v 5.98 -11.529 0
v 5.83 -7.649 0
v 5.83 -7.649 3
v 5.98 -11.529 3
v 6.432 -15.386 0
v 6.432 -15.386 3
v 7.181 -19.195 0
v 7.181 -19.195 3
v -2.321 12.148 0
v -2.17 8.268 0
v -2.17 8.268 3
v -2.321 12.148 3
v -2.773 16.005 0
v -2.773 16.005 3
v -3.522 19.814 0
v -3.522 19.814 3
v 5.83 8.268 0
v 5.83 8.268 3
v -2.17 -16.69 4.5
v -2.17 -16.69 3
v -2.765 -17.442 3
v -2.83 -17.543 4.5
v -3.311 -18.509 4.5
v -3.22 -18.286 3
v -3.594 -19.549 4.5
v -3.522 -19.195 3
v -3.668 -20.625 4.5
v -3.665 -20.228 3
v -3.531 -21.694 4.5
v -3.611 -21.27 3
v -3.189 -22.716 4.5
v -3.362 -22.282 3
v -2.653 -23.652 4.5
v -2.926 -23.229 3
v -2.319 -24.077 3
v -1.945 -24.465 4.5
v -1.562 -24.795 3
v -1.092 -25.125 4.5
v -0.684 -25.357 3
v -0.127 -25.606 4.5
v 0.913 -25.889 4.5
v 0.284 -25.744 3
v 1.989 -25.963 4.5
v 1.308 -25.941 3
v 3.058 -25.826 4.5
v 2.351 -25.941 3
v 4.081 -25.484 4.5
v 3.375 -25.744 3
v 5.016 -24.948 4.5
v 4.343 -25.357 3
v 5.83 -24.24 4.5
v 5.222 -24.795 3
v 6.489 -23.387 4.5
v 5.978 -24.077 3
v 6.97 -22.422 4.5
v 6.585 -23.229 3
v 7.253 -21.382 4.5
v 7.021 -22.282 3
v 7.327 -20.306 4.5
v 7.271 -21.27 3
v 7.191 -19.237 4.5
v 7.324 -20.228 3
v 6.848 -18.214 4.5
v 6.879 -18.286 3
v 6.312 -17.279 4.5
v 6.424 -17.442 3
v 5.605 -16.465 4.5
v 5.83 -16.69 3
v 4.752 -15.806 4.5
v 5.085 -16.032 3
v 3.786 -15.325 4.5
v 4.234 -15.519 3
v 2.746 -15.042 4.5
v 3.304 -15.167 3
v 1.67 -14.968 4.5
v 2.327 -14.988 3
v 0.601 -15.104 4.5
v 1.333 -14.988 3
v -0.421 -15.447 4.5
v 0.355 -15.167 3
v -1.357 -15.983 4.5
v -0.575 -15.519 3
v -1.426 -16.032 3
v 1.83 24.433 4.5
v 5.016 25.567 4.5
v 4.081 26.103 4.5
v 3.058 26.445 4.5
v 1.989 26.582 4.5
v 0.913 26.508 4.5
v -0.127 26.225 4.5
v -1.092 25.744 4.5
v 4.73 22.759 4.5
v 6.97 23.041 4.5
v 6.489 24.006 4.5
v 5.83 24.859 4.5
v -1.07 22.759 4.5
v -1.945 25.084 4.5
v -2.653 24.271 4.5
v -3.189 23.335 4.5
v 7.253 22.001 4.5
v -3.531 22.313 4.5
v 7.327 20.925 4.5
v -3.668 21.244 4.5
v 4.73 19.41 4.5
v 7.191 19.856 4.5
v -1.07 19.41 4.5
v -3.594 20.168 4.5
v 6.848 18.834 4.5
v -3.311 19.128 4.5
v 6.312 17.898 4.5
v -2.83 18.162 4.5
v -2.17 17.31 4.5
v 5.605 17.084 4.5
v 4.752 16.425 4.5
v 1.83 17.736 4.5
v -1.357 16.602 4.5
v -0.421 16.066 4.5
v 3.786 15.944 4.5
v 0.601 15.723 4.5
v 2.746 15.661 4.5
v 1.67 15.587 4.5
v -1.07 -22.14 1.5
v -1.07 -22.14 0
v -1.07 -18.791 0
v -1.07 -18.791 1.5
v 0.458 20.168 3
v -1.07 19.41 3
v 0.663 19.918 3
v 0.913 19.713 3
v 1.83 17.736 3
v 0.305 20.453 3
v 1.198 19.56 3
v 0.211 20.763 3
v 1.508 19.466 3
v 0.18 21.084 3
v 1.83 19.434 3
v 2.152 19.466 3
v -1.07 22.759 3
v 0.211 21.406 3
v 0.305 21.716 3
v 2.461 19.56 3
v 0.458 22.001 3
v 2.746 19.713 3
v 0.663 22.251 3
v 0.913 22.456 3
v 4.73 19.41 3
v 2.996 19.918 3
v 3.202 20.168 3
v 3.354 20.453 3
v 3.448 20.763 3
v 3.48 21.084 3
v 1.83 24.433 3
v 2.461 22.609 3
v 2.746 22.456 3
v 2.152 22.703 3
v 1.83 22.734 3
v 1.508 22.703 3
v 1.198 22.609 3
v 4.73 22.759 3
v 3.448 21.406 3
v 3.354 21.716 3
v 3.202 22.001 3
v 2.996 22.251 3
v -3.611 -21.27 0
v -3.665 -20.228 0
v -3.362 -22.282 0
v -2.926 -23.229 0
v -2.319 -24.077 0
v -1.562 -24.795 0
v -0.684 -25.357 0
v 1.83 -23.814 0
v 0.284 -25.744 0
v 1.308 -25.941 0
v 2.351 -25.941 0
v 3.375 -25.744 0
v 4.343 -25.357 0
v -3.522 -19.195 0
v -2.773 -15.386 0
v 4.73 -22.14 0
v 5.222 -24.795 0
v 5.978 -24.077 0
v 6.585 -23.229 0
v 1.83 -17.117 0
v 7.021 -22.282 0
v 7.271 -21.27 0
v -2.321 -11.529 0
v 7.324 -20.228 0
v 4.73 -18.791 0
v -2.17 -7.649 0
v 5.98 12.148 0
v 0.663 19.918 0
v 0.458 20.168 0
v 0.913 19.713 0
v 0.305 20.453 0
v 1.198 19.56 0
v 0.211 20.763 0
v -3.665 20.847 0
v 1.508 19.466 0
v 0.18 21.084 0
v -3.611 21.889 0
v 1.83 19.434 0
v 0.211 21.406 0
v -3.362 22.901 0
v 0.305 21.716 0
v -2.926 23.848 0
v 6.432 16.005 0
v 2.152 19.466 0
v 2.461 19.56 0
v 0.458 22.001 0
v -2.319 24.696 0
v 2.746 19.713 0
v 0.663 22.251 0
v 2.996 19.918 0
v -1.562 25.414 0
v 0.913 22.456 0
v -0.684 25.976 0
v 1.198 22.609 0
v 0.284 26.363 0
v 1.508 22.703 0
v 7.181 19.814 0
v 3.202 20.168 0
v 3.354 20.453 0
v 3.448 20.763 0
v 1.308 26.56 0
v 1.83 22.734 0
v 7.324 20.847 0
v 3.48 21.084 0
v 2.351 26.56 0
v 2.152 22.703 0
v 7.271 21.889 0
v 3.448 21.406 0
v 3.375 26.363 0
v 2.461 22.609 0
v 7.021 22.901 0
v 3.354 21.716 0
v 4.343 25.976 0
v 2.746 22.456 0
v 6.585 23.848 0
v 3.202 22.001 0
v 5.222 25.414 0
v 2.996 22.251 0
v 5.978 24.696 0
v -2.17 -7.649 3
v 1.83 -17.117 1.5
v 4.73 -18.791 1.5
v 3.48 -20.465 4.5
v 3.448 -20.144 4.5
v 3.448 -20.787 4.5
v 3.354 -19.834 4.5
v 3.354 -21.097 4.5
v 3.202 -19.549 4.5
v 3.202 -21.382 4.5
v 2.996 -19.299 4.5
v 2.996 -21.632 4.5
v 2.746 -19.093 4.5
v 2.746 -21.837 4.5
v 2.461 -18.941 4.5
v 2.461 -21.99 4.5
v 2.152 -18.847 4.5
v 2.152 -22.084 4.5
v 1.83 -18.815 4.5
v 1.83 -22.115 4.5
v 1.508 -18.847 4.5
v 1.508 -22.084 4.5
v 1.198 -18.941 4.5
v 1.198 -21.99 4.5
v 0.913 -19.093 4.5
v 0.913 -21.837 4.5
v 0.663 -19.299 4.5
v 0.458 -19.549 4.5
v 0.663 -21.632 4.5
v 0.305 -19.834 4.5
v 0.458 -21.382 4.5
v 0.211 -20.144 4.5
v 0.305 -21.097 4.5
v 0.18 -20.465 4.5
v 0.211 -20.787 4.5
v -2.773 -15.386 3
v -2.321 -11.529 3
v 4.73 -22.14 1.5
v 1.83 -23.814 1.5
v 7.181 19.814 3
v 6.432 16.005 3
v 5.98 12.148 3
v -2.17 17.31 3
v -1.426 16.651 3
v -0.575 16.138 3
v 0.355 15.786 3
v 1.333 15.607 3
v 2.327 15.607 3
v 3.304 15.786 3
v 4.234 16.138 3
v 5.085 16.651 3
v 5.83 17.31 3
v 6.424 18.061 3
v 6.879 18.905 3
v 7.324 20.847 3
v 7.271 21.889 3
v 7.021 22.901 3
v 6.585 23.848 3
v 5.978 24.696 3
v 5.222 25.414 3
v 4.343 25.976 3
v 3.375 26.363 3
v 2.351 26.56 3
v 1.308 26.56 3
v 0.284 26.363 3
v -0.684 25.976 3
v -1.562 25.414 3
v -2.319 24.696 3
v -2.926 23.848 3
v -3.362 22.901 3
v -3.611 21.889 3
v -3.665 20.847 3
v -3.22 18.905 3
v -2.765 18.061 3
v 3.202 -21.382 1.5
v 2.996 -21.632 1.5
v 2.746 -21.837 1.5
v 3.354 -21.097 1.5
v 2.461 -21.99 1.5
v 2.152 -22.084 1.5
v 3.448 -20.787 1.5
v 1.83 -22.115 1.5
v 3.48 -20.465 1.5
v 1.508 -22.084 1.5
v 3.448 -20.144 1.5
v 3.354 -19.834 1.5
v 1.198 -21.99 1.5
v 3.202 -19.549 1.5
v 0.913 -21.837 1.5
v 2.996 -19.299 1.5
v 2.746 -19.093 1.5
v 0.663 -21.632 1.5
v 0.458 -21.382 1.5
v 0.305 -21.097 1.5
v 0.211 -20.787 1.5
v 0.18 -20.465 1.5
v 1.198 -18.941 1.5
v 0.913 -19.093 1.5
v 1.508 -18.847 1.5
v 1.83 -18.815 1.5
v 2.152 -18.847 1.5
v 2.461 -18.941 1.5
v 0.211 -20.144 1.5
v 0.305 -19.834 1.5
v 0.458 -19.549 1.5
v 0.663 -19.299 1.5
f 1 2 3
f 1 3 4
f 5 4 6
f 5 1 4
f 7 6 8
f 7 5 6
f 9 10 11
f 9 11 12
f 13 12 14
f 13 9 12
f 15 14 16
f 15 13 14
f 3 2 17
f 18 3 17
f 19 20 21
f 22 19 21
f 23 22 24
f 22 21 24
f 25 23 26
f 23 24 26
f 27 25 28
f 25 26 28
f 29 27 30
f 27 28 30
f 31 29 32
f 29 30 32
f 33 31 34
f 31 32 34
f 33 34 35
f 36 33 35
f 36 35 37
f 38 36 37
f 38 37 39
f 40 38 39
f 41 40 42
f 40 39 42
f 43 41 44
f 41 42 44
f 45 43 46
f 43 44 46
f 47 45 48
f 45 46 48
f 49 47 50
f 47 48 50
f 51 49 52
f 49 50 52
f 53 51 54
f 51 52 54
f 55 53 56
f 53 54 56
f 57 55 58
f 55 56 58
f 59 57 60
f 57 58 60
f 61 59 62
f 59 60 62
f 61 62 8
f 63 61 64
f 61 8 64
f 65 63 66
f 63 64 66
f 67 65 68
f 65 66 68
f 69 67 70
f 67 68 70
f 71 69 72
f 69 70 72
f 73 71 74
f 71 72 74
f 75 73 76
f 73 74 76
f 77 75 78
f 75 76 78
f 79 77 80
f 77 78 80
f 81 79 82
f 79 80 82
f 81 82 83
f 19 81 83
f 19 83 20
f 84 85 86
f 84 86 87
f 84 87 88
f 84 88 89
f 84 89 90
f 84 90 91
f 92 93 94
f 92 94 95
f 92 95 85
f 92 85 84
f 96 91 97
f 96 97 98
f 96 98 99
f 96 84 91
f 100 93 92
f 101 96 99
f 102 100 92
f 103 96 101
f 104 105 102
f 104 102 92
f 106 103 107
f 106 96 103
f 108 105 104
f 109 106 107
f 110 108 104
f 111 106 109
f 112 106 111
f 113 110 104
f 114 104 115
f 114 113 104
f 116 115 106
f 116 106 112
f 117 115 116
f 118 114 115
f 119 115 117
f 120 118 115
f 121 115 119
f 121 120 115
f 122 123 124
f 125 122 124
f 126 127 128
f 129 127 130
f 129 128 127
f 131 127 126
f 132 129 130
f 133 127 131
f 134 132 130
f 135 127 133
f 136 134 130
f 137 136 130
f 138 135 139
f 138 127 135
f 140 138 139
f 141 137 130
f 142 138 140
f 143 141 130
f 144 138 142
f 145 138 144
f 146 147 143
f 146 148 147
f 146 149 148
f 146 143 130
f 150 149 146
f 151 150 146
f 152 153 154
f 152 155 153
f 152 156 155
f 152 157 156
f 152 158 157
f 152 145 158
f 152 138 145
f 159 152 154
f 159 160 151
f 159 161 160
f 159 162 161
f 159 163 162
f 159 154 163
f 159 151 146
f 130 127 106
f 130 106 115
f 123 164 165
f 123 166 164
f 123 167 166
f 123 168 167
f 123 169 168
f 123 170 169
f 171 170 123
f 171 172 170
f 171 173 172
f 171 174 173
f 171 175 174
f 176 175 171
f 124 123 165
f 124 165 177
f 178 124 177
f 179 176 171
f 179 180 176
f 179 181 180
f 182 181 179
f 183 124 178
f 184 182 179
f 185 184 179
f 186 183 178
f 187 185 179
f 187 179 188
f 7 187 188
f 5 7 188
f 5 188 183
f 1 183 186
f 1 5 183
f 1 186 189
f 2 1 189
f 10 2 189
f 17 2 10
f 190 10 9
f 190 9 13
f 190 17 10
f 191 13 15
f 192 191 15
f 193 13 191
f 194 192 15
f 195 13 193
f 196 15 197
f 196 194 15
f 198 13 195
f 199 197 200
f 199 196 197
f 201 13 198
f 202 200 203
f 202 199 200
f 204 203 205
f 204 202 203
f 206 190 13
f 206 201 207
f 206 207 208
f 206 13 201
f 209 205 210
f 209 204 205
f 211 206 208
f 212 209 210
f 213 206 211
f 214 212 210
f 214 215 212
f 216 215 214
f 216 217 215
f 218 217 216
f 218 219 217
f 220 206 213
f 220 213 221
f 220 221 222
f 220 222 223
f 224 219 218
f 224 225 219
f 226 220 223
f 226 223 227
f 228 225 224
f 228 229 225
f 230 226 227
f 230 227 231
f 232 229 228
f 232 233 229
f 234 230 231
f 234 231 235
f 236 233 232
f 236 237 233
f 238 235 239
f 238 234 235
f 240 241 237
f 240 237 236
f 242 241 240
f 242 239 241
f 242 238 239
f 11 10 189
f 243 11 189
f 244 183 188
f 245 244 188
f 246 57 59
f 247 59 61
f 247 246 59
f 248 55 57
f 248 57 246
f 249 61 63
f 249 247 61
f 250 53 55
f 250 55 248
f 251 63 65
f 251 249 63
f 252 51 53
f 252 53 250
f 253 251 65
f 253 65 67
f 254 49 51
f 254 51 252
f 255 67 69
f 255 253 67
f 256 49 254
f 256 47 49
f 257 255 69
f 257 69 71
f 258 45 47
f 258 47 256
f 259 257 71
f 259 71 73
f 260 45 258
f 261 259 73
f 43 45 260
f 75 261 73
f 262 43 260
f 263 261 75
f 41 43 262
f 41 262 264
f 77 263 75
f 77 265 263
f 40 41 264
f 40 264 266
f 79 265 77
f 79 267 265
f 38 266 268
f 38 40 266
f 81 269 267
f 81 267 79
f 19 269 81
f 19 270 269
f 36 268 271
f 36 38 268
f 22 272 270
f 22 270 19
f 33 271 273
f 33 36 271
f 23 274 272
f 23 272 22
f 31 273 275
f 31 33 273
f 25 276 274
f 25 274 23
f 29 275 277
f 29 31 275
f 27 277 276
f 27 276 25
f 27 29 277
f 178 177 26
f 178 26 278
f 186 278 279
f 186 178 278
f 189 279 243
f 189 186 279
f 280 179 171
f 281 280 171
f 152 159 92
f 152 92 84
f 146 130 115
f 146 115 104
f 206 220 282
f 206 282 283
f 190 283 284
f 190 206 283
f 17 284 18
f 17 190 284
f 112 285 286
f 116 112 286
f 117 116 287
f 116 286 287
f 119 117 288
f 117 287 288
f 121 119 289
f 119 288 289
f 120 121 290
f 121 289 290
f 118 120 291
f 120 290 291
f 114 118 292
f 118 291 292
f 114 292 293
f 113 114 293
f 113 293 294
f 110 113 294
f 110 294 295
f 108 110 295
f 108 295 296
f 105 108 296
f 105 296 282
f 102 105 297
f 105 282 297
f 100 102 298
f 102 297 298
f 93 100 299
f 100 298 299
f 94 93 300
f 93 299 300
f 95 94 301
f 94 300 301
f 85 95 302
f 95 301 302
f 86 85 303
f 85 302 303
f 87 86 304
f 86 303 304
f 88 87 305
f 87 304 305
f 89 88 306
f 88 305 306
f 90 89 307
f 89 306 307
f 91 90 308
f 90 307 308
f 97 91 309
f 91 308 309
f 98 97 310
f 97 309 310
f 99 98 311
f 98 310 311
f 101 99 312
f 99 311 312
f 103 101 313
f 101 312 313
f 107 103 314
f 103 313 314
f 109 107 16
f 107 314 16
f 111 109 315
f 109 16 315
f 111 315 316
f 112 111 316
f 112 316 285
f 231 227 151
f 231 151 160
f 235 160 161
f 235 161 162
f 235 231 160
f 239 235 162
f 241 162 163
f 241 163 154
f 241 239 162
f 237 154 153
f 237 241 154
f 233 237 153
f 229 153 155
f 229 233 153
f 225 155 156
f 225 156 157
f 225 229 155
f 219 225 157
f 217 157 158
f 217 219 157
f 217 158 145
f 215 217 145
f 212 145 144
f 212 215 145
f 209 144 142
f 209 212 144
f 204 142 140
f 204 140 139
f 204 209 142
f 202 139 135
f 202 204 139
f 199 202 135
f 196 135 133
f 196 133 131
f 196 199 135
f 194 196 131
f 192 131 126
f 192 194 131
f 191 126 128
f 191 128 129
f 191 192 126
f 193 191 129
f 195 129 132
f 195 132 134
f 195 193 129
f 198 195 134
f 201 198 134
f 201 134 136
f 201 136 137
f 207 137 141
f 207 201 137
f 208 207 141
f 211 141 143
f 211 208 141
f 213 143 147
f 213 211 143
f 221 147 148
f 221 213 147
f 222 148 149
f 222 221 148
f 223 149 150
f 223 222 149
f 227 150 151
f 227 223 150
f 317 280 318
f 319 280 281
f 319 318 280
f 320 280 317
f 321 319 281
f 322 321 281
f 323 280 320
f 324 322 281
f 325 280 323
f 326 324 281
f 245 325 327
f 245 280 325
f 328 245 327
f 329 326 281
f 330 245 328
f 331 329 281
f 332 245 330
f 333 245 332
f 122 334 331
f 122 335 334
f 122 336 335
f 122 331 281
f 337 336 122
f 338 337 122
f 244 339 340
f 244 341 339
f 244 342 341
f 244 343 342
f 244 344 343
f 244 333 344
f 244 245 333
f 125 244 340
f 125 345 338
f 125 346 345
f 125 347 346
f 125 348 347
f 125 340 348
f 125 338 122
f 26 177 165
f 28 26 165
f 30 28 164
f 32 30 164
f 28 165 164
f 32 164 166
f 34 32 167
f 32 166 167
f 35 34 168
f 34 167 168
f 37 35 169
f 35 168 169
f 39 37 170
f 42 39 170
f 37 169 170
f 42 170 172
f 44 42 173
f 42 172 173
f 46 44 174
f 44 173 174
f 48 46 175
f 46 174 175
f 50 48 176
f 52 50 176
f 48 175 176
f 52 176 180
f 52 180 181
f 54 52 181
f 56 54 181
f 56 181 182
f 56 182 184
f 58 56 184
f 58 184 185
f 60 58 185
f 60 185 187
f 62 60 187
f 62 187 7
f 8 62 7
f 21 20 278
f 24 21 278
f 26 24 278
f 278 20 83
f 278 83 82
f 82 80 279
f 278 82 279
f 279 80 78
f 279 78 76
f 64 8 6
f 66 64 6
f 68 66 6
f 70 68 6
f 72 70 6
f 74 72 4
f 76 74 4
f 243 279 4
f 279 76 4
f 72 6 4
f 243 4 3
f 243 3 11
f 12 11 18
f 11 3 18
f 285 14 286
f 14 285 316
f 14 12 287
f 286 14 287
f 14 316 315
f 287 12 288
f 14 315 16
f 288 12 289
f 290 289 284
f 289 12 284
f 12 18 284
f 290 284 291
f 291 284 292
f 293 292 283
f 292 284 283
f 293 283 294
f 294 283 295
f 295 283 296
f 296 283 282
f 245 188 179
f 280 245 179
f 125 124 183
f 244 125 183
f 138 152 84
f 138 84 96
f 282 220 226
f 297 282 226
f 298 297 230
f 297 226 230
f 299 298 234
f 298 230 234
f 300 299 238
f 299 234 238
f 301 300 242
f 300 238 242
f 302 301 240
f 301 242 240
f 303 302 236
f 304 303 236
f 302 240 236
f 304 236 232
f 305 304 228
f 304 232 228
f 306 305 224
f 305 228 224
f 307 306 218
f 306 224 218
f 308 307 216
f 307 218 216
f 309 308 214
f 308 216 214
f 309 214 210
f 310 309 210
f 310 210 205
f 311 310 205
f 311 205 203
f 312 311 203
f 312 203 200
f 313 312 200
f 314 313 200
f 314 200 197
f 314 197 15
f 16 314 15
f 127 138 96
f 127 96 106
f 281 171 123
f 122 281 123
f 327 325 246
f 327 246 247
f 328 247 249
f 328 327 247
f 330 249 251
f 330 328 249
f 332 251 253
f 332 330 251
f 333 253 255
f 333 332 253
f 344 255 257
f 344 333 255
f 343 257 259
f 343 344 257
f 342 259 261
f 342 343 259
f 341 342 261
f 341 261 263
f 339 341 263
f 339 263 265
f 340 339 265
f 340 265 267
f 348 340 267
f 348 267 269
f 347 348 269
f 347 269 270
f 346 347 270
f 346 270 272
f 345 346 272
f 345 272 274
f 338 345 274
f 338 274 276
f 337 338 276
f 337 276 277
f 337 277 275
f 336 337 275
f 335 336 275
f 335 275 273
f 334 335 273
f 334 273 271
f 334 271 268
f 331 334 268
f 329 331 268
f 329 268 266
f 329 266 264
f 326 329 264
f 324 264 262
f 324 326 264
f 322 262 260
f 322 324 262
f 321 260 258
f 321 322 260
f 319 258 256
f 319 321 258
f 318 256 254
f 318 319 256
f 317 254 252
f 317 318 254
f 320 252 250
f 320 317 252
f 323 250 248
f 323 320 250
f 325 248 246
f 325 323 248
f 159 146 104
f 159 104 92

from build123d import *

# Parameters (mm, degrees)
SKETCH_1_R          = 1.65
EXTRUDE_1_DEPTH     = 3
SKETCH_2_R          = 5.5
SKETCH_2_R_2        = 1.65
EXTRUDE_2_DEPTH     = 1.5
FILLET_2_R          = 50
CUT_EXTRUDE_1_DEPTH = 1.5


with BuildPart() as part:
    # 草图1 → 凸台-拉伸1 (new body)
    with BuildSketch(Plane.XY):
        with BuildLine():
            Line((-2.170396733, 17.309509621), (-2.170396733, -16.690490379))
            ThreePointArc((-2.170396733, -16.690490379), (1.829603267, -25.965407597), (5.829603267, -16.690490379))
            Line((5.829603267, -16.690490379), (5.829603267, 17.309509621))
            ThreePointArc((5.829603267, 17.309509621), (1.829603267, 26.584426838), (-2.170396733, 17.309509621))
        make_face()
        with Locations((1.829603267, 21.084426838)):
            Circle(SKETCH_1_R, mode=Mode.SUBTRACT)
        with Locations((1.829603267, -20.465407597)):
            Circle(SKETCH_1_R, mode=Mode.SUBTRACT)
    extrude(amount=EXTRUDE_1_DEPTH)

    # 草图2 → 凸台-拉伸2 (add)
    # profile 1 of 2: a face of its own
    with BuildSketch(Plane.XY.offset(3)):
        with Locations(Location((1.829603267, 21.084426838, 0), (0, 0, 223.341758227))):
            Circle(SKETCH_2_R)
        Polygon((-1.070396733, 22.758742619), (-1.070396733, 19.410111058), (1.829603267, 17.735795277), (4.729603267, 19.410111058), (4.729603267, 22.758742619), (1.829603267, 24.433058399), align=None, mode=Mode.SUBTRACT)
    # profile 2 of 2: a face of its own
    with BuildSketch(Plane.XY.offset(3)):
        with Locations(Location((1.829603267, -20.465407597, 0), (0, 0, 136.658241773))):
            Circle(SKETCH_2_R)
        with Locations((1.829603267, -20.465407597)):
            Circle(SKETCH_2_R_2, mode=Mode.SUBTRACT)
    extrude(amount=EXTRUDE_2_DEPTH)

    # 圆角2
    # the kernel refuses this fillet: 50 mm, written as the material it adds along each edge
    with BuildSketch(Plane(origin=(-2.170396733, -16.690490379, 0), x_dir=(0, 1, 0), z_dir=(0, 0, 1)), Plane(origin=(5.829603267, 17.309509621, 0), x_dir=(0, -1, 0), z_dir=(0, 0, 1))) as fillet_2_piece_1:
        with BuildLine():
            CenterArc((9.0410884, 50), FILLET_2_R, 256.648815668, 13.351184332)
            ThreePointArc((-2.504862607, 1.351351351), (-1.163505185, 0.840508981), (0, 0))
            Line((0, 0), (9.0410884, 0))
        make_face()
    extrude(amount=3)
    with BuildSketch(Plane(origin=(-2.170396733, 17.309509621, 0), x_dir=(0, -1, 0), z_dir=(0, 0, 1)), Plane(origin=(5.829603267, -16.690490379, 0), x_dir=(0, 1, 0), z_dir=(0, 0, 1))) as fillet_2_piece_2:
        with BuildLine():
            CenterArc((9.0410884, -50), FILLET_2_R, 90, 13.351184332)
            ThreePointArc((-2.504862607, -1.351351351), (-1.163505185, -0.840508981), (0, 0))
            Line((0, 0), (9.0410884, 0))
        make_face()
    extrude(amount=3)

    # 草图5 → 切除-拉伸1 (cut)
    with BuildSketch(Plane(origin=(0, 0, 0), x_dir=(-1, 0, 0), z_dir=(0, 0, -1))):
        Polygon((-4.729603267, -18.791091816), (-4.729603267, -22.139723378), (-1.829603267, -23.814039158), (1.070396733, -22.139723378), (1.070396733, -18.791091816), (-1.829603267, -17.116776036), align=None)
    extrude(amount=-CUT_EXTRUDE_1_DEPTH, mode=Mode.SUBTRACT)


solid = part.part
